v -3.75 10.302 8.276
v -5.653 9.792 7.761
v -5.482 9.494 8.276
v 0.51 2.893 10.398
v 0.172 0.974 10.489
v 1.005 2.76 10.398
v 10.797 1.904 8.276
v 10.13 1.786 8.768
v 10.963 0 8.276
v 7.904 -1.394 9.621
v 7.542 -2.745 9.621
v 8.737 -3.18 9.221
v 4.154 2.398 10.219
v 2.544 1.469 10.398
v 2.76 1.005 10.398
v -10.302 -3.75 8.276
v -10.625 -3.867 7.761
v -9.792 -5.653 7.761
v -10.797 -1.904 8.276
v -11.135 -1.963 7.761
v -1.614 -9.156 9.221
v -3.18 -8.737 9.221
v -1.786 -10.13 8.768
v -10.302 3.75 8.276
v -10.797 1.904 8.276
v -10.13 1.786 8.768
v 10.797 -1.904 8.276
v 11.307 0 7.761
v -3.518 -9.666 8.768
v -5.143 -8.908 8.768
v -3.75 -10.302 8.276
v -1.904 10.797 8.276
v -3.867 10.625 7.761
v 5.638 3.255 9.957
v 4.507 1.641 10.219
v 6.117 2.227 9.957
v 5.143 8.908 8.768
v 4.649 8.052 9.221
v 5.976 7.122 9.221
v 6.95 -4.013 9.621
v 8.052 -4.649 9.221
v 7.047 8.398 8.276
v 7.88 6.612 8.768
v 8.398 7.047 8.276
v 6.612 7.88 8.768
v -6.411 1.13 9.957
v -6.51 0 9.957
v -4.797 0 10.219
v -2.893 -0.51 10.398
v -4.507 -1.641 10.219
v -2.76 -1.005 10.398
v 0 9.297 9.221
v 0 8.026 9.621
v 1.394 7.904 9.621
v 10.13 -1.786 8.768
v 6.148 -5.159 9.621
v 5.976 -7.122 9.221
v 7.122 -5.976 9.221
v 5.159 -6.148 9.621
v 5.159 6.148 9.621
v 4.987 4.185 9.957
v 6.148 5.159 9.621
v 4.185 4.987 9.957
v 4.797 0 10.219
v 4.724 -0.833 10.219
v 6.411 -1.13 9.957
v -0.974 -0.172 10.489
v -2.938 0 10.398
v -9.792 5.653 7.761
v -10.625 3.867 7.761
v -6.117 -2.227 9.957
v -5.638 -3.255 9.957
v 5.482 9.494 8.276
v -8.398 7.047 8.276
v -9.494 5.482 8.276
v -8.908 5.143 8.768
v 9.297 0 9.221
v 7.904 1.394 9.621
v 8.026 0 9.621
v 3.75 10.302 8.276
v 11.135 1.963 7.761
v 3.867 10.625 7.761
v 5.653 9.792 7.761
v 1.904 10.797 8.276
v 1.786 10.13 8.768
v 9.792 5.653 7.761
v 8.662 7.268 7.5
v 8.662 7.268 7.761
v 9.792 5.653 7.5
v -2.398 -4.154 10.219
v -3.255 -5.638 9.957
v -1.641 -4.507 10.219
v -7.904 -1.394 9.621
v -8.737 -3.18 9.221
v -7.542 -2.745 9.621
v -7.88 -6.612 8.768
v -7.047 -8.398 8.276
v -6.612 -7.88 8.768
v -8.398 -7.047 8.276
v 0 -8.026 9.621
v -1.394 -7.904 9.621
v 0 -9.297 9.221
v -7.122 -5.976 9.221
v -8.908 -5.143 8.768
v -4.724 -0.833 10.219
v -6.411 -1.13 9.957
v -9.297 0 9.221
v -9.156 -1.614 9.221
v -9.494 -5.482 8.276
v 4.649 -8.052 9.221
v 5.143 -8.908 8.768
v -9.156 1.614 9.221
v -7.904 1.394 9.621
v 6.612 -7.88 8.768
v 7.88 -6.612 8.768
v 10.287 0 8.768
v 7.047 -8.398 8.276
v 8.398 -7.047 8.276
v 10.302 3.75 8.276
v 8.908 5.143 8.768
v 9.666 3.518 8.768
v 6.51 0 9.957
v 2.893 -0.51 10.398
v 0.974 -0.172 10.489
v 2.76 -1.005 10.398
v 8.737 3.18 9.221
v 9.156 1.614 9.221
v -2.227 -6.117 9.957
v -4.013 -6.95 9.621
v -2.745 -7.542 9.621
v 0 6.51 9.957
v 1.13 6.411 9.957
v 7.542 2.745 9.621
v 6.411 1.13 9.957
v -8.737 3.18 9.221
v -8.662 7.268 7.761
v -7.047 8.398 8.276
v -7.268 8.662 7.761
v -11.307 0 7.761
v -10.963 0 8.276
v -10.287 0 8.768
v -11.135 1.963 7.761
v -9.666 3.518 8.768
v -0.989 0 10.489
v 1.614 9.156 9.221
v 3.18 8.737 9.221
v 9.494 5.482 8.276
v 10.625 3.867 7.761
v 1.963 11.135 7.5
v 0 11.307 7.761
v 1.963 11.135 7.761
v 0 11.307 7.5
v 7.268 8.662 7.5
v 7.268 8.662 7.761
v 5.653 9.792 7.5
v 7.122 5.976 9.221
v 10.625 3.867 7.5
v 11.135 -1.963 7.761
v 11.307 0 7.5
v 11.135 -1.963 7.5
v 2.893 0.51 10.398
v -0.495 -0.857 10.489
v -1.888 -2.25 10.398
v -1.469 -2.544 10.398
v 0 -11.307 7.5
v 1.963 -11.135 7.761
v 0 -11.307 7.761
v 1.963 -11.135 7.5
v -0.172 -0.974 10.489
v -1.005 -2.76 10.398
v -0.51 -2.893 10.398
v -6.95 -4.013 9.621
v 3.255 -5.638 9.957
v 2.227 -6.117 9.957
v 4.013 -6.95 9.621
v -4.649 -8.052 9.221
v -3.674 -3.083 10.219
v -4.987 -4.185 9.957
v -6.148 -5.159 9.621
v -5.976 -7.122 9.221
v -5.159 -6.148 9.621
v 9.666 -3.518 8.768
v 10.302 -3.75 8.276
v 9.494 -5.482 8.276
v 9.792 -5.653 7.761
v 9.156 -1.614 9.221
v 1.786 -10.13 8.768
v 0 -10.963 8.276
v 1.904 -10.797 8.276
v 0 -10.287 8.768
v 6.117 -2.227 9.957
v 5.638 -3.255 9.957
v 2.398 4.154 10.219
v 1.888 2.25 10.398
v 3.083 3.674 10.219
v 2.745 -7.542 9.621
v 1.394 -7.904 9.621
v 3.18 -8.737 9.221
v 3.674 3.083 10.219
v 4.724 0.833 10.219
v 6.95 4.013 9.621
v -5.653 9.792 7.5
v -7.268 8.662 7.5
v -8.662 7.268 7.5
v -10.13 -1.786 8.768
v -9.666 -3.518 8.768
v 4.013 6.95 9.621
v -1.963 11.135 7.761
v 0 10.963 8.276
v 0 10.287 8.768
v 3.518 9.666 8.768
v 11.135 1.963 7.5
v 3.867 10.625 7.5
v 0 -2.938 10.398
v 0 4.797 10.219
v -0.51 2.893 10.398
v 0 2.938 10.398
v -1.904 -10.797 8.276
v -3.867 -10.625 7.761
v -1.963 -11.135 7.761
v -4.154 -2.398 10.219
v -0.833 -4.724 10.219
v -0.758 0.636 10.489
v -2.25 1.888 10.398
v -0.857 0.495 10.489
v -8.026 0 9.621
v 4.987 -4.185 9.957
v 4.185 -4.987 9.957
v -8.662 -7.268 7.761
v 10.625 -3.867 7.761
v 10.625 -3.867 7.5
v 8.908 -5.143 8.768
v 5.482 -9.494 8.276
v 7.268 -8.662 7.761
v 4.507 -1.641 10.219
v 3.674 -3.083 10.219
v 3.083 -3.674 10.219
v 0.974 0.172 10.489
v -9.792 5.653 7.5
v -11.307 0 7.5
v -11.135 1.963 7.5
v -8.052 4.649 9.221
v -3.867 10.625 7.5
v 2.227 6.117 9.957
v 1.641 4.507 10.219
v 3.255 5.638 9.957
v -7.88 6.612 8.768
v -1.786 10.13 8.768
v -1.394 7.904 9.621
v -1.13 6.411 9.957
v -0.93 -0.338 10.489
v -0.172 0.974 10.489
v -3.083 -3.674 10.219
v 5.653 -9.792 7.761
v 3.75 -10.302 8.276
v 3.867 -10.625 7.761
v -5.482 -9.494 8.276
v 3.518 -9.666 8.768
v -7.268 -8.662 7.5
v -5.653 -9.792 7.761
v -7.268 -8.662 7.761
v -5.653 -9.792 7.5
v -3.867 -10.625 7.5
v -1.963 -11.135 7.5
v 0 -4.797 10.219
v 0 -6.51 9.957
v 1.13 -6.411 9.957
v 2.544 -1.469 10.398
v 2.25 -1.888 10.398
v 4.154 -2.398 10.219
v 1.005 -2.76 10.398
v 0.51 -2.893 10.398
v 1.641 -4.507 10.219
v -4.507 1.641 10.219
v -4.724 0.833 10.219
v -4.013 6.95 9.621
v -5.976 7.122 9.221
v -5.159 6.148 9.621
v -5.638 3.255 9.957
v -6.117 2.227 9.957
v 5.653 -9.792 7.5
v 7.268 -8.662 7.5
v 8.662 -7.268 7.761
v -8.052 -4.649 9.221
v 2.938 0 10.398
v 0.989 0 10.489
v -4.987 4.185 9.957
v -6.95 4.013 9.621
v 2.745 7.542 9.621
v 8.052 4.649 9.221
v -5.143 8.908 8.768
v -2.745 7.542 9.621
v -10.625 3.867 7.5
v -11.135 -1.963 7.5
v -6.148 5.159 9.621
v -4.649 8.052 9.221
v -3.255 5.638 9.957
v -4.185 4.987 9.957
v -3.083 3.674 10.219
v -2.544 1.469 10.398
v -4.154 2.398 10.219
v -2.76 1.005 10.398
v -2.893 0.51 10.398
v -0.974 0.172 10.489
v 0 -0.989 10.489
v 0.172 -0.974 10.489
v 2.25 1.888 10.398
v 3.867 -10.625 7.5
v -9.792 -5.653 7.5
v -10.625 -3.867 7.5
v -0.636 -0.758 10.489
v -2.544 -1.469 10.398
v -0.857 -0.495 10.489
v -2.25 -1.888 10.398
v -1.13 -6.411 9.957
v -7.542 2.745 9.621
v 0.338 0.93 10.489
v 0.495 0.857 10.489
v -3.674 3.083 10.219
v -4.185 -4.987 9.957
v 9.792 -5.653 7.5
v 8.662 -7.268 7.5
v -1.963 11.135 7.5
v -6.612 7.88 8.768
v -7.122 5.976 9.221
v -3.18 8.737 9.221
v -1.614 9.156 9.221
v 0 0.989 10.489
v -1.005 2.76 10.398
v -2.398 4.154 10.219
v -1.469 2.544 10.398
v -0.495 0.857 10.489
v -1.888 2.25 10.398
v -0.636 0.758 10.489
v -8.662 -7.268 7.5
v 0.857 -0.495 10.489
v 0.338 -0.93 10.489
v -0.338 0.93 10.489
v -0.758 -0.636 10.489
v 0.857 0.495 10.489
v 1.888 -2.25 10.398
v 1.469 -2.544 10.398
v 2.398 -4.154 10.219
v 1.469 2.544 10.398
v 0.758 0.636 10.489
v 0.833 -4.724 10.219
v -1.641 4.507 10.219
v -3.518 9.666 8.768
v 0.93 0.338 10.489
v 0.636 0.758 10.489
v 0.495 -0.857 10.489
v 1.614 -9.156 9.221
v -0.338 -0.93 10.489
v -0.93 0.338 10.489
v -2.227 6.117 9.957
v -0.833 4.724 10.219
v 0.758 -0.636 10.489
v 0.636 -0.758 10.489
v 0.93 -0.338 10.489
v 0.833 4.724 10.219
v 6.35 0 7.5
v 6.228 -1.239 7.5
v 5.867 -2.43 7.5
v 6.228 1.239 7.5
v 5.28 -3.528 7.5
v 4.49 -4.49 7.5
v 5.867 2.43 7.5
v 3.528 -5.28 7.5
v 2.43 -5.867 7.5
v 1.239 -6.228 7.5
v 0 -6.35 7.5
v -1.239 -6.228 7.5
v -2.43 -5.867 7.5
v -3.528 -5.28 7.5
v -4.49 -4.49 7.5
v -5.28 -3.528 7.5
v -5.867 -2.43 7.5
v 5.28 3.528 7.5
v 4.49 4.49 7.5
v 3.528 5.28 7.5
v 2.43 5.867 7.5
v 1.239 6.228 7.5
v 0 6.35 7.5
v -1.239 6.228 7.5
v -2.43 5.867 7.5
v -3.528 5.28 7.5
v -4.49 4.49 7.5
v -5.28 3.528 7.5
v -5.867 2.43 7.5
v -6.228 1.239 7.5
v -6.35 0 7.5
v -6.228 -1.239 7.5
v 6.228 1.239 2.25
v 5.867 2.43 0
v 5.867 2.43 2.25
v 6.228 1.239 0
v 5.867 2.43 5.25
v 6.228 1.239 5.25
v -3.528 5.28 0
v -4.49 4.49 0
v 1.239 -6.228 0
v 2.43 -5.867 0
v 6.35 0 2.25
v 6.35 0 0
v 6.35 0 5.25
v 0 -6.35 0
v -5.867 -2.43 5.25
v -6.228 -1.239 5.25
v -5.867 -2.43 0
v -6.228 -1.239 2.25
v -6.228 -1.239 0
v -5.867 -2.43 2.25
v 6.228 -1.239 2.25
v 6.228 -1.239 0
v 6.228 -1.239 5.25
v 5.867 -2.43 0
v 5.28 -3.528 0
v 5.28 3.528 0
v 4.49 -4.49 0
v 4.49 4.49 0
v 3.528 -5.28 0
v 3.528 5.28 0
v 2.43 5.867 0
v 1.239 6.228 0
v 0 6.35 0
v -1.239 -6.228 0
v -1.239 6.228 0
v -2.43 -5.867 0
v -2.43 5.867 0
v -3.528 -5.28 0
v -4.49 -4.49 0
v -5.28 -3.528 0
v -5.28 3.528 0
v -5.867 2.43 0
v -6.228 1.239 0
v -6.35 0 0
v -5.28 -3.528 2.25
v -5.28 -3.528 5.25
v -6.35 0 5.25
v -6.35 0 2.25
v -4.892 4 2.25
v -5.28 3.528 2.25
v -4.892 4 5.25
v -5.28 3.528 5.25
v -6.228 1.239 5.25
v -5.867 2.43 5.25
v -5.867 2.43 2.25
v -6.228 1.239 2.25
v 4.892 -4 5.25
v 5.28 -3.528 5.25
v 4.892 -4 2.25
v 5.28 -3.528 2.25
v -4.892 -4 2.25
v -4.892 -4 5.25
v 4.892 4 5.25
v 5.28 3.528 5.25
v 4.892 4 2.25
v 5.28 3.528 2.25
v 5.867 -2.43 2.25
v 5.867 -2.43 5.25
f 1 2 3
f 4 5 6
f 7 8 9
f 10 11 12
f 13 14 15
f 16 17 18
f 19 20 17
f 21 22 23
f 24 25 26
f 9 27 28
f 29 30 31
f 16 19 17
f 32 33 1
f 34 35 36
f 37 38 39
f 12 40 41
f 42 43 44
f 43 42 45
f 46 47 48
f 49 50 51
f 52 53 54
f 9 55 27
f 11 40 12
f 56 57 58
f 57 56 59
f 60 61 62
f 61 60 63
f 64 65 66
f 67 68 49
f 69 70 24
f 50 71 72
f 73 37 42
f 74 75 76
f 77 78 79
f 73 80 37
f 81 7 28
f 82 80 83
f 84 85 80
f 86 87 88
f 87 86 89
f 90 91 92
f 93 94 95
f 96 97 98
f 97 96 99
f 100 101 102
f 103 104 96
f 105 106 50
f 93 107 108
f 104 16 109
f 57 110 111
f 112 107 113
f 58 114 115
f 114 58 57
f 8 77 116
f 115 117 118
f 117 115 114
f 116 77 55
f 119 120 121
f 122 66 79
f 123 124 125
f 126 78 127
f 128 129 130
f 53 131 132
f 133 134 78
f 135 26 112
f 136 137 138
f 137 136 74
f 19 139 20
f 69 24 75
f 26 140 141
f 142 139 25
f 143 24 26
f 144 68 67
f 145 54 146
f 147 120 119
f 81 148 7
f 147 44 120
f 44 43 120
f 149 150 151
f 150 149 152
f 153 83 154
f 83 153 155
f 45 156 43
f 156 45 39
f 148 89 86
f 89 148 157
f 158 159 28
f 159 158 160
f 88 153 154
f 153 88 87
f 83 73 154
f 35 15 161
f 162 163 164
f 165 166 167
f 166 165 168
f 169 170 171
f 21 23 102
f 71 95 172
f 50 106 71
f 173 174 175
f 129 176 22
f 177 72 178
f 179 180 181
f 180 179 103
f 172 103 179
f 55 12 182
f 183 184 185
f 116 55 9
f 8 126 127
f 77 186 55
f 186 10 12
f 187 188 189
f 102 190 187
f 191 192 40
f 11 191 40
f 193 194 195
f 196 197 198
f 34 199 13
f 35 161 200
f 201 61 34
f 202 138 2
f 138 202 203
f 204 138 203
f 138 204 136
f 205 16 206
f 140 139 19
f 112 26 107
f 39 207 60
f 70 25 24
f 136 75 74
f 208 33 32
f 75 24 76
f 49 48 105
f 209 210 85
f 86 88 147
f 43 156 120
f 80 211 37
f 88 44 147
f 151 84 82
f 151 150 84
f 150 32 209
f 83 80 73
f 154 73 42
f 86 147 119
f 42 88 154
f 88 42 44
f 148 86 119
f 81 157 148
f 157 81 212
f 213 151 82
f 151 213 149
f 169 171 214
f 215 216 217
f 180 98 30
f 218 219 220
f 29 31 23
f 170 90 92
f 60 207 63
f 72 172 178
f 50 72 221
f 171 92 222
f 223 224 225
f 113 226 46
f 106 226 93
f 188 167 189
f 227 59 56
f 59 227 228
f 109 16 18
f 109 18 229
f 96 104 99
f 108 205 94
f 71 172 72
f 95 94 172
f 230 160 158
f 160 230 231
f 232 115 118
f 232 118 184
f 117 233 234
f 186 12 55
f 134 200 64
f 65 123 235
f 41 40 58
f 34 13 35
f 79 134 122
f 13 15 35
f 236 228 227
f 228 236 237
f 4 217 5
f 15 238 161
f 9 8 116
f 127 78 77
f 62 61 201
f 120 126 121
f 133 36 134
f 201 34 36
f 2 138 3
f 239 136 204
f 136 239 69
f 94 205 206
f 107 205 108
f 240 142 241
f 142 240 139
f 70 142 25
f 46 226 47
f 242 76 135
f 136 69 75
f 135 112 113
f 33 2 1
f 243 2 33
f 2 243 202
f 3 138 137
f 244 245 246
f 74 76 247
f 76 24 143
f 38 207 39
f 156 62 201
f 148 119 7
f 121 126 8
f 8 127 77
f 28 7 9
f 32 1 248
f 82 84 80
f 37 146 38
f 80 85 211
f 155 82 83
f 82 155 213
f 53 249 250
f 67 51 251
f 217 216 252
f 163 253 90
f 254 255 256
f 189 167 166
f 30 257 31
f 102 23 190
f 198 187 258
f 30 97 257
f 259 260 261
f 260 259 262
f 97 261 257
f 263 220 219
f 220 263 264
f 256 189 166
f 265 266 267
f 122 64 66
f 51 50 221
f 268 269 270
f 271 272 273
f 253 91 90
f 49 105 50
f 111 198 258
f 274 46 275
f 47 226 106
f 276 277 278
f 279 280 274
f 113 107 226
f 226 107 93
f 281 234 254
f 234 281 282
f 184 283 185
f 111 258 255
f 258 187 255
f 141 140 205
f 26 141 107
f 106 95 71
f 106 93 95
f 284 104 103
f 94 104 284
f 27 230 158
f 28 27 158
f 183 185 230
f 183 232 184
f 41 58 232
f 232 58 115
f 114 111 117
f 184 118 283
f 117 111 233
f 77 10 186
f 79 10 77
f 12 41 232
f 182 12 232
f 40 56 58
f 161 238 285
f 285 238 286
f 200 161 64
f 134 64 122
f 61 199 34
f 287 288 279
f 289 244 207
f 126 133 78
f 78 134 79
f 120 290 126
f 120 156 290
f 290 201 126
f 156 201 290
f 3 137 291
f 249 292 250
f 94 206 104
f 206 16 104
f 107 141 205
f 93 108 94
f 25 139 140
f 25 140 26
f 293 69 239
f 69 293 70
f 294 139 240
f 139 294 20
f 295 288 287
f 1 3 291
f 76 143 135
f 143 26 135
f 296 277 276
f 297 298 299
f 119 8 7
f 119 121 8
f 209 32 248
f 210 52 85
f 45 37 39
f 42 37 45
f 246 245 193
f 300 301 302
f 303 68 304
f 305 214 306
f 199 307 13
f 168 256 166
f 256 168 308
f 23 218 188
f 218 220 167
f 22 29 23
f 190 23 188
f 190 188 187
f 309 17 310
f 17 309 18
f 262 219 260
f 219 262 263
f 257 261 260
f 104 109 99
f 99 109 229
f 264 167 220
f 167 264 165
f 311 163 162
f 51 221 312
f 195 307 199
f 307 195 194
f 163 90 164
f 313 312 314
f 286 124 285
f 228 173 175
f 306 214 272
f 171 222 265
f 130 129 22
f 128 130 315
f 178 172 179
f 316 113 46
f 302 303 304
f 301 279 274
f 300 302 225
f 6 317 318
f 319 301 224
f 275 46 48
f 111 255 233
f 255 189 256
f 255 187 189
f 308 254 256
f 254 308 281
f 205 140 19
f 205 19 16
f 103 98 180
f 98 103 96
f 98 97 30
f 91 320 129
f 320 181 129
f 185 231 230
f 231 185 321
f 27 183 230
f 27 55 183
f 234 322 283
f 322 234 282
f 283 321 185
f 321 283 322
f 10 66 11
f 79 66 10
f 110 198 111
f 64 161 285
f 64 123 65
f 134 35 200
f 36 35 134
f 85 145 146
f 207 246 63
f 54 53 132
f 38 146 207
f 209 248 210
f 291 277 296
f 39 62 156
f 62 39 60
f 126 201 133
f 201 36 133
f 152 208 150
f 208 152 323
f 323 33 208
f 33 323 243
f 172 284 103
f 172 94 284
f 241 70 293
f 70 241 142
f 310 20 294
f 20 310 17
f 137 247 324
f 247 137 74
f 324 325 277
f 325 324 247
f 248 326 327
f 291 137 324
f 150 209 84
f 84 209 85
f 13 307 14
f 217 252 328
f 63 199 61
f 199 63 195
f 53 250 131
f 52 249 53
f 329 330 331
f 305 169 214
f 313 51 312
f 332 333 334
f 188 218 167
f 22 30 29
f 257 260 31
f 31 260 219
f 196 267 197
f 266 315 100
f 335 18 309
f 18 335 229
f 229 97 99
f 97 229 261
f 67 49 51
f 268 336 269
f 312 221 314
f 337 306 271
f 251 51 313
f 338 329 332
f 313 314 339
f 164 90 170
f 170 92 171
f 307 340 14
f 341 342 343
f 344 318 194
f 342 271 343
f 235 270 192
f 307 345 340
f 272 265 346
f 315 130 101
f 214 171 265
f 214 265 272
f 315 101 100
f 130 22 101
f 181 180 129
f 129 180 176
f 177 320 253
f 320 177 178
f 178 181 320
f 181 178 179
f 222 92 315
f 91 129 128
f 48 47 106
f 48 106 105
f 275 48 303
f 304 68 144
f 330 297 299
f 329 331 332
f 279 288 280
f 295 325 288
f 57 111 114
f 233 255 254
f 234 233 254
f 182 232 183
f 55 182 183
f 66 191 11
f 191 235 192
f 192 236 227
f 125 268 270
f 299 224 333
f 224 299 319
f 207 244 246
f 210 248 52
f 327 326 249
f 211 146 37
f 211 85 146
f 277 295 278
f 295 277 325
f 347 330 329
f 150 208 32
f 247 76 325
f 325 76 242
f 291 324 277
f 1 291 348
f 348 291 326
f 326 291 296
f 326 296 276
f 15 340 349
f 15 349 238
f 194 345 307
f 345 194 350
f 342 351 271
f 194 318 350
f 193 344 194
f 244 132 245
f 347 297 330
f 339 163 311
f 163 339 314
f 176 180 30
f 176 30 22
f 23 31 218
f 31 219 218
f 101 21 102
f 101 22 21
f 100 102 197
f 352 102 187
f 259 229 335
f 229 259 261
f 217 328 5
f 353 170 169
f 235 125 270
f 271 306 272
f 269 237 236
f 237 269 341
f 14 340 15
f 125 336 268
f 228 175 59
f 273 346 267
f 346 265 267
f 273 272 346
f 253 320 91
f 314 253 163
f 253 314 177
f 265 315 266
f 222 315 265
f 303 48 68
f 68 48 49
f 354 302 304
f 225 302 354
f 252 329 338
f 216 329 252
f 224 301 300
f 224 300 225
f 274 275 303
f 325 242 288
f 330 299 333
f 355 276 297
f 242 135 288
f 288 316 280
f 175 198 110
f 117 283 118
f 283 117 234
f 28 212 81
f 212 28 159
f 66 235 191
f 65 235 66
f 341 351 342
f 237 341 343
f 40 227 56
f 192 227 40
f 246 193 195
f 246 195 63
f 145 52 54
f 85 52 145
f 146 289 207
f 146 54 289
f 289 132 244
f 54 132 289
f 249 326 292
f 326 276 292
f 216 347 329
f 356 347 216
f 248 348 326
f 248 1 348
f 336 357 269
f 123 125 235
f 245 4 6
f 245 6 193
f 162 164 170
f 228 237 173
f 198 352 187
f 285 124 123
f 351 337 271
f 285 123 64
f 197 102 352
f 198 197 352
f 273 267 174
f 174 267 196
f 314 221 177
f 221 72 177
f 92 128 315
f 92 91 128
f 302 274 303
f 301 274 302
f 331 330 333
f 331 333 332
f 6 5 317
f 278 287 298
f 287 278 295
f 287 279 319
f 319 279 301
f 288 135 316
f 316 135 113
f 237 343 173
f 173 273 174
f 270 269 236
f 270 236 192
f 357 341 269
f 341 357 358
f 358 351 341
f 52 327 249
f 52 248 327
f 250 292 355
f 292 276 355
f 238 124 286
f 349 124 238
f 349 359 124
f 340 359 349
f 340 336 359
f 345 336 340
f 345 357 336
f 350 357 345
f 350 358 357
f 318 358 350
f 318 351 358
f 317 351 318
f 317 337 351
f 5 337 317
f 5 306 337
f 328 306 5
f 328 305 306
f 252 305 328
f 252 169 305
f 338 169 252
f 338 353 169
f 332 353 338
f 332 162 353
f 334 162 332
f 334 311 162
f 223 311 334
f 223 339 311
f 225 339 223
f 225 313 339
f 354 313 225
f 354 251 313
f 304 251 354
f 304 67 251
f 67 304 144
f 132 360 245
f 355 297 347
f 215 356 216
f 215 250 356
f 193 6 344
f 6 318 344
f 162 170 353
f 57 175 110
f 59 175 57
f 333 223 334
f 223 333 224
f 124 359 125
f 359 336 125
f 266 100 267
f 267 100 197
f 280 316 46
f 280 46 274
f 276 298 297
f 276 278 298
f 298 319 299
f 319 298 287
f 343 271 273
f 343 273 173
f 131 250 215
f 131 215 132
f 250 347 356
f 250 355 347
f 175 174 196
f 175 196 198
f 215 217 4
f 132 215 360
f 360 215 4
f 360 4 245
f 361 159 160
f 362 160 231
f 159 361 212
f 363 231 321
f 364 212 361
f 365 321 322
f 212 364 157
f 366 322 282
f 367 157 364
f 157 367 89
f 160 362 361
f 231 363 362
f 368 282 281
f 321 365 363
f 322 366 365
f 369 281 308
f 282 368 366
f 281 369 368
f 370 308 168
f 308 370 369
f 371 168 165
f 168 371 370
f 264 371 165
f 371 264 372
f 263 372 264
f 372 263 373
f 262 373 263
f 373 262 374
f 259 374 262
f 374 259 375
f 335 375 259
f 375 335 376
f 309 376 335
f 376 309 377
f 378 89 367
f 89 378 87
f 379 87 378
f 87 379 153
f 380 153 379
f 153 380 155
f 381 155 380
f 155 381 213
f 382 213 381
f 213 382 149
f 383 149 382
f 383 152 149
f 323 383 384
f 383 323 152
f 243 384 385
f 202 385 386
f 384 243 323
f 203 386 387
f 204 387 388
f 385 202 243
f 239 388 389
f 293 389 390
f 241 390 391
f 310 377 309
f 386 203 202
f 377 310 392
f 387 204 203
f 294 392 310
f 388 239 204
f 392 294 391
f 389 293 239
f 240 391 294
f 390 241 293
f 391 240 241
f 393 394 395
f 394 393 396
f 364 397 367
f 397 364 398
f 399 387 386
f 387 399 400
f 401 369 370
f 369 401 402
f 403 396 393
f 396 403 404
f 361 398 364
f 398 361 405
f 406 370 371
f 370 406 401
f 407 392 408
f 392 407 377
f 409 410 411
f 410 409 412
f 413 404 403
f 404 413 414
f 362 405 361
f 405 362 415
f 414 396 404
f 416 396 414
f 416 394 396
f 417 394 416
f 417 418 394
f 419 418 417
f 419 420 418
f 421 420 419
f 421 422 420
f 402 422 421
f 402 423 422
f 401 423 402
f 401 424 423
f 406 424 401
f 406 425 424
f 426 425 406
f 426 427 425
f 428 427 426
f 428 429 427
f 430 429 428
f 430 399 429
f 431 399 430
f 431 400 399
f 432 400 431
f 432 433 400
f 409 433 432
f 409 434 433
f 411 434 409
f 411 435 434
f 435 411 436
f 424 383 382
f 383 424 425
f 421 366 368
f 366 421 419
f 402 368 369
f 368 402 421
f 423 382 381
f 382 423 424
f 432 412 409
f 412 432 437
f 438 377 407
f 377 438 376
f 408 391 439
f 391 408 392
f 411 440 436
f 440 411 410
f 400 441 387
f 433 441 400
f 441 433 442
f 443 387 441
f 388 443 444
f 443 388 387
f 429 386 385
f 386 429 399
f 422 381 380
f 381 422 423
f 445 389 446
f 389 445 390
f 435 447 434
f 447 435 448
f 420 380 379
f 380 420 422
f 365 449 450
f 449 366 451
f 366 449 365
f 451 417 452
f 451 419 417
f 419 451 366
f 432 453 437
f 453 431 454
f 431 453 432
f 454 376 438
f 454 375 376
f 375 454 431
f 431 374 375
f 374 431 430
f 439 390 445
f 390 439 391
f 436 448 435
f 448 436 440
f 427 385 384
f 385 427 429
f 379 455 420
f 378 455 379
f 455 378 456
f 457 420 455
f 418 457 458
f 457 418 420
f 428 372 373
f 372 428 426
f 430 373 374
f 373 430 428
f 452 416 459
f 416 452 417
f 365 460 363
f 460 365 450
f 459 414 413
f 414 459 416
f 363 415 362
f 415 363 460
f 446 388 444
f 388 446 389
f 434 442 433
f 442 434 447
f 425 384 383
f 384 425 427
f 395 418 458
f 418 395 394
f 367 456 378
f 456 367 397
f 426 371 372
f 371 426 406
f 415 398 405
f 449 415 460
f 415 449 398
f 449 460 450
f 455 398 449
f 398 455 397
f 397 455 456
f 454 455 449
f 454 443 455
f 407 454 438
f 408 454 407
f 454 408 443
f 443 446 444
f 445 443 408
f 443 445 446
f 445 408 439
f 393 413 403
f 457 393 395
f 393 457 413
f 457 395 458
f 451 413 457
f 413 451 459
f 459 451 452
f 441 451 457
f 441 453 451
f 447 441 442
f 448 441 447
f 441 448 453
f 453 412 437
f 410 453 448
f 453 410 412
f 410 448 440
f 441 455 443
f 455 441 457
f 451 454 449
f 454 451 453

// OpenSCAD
$fa=0.5;
$fp=1;

PLUG_HEIGHT=7.5;
HOLE_RADIUS=6.35;

translate([0, 0, PLUG_HEIGHT]) union() {
    difference() {
        scale([1, 1, 3 / (HOLE_RADIUS + 5)]) sphere(r=HOLE_RADIUS + 5);
        translate([-15, -15, -20]) cube([30, 30, 20]);
    }
    
    difference() {
        translate([0, 0, -1 * PLUG_HEIGHT]) linear_extrude(PLUG_HEIGHT) circle(r=6.35, $fn=32);
        translate([-15, -4, -1 * ((PLUG_HEIGHT * 0.5) + 1.5)]) cube([30, 8, 3]);
    }
}
